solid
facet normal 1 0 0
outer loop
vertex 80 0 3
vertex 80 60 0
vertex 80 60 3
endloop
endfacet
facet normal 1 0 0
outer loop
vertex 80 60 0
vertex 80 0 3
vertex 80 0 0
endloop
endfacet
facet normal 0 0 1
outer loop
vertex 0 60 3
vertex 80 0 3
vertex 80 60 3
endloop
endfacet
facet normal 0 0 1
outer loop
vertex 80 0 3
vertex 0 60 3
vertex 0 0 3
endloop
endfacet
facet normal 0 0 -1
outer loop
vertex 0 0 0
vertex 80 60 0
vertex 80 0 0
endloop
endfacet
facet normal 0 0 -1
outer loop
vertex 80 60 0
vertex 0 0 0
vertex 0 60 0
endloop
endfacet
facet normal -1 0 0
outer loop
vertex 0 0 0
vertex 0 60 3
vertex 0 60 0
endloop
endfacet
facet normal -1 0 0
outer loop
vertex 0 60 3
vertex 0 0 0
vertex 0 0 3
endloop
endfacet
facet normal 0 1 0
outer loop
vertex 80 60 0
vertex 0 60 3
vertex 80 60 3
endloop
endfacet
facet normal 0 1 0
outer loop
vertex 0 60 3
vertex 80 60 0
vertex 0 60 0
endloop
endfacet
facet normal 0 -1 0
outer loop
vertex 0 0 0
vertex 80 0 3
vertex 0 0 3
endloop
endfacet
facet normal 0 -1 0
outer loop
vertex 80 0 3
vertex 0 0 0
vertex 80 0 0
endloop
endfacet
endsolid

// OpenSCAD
// --- Dimensions ---

// Base Plate dimensions
plate_length_x = 80;  // X dimension of the flat plate (mm)
plate_width_y = 60;   // Y dimension of the flat plate (mm)
plate_thickness = 3;  // Z thickness of the flat plate (mm)

// Camera Hole dimensions
camera_hole_diameter = 12; // Diameter of the hole for the phone camera (mm)
camera_hole_x = -20;       // X position of the camera hole center (mm)
camera_hole_y = 10;        // Y position of the camera hole center (mm)

// Sleeve dimensions
sleeve_outer_diameter = 36.6; // Outer diameter of the round sleeve (mm)
sleeve_inner_bore_stop_z = 11; // Z height where inner bore changes (mm)
sleeve_inner_bore_start_z = 3;  // Z height where inner bore starts (mm)
sleeve_inner_bore_diameter = 22; // Diameter of the stop bore (mm)
sleeve_outer_top_diameter = 30.6; // Diameter for eyepiece sliding section (mm)

// Screw hole dimensions
screw_hole_diameter = 2.5;  // Diameter for M3 centering screws (mm)
screw_hole_z_level = 21;    // Z height where screw holes are located (mm)
num_screws = 3;             // Number of radial mounting screws

// Total sleeve height calculation: From Z=3 to top. Top is implicitly defined by the required bore change, let's assume a reasonable total height based on the stop at Z=11 and the need for screw holes at Z=21. We will make the overall height 32mm (Z=0 to Z=32) to accommodate all features cleanly above the plate base.
total_sleeve_height = 32;

// --- Constants ---
$fn = 64; // High resolution for curves

// --- Modules ---

// Module to create the main plate
module base_plate() {
    cube([plate_length_x, plate_width_y, plate_thickness]);
}

// Module to cut the camera hole through the plate
module camera_hole_cutter() {
    translate([camera_hole_x, camera_hole_y, -0.1]) { // Extend slightly below Z=0
        cylinder(h = plate_thickness + 0.2, r = camera_hole_diameter / 2);
    }
}

// Module to create the sleeve structure
module round_sleeve() {
    // The sleeve is centered on the X/Y plane of the hole for placement later
    translate([camera_hole_x, camera_hole_y, 0]) {

        difference() {
            // 1. Outer shape (full height) - Using the largest OD for the main body structure
            cylinder(h = total_sleeve_height + 0.2, r = sleeve_outer_diameter / 2);

            // 2. Inner bore section 1 (Stop: Z=3 to Z=11)
            translate([0, 0, sleeve_inner_bore_start_z]) {
                cylinder(h = sleeve_inner_bore_stop_z - sleeve_inner_bore_start_z + 0.2, r = sleeve_inner_bore_diameter / 2);
            }

            // 3. Inner bore section 2 (Eyepiece slide: Z=11 to Top)
            // This cut must be made from the top of the stop bore up to the total height.
            translate([0, 0, sleeve_inner_bore_stop_z]) {
                cylinder(h = total_sleeve_height - sleeve_inner_bore_stop_z + 0.2, r = sleeve_outer_top_diameter / 2);
            }

            // 4. Screw holes (Radial cuts through the wall at Z=21)
            for (i = [0 : num_screws - 1]) {
                angle = i * (360 / num_screws);
                rotate([0, 0, angle]) {
                    // Cut a hole centered on the sleeve axis, extending through the wall thickness.
                    // The cut must be large enough to pass through the material at Z=21.
                    translate([0, 0, screw_hole_z_level - 0.1]) {
                        cylinder(h = 1.0 + 0.2, r = screw_hole_diameter / 2);
                    }
                }
            }
        }
    }
}

// --- Assembly ---

difference() {
    // 1. Base Plate (rests on Z=0)
    base_plate();

    // 2. Cut Camera Hole in the plate
    camera_hole_cutter();

    // 3. Sleeve structure placed on top of the plate (starts at Z=3)
    translate([0, 0, plate_thickness]) {
        round_sleeve();
    }
}
